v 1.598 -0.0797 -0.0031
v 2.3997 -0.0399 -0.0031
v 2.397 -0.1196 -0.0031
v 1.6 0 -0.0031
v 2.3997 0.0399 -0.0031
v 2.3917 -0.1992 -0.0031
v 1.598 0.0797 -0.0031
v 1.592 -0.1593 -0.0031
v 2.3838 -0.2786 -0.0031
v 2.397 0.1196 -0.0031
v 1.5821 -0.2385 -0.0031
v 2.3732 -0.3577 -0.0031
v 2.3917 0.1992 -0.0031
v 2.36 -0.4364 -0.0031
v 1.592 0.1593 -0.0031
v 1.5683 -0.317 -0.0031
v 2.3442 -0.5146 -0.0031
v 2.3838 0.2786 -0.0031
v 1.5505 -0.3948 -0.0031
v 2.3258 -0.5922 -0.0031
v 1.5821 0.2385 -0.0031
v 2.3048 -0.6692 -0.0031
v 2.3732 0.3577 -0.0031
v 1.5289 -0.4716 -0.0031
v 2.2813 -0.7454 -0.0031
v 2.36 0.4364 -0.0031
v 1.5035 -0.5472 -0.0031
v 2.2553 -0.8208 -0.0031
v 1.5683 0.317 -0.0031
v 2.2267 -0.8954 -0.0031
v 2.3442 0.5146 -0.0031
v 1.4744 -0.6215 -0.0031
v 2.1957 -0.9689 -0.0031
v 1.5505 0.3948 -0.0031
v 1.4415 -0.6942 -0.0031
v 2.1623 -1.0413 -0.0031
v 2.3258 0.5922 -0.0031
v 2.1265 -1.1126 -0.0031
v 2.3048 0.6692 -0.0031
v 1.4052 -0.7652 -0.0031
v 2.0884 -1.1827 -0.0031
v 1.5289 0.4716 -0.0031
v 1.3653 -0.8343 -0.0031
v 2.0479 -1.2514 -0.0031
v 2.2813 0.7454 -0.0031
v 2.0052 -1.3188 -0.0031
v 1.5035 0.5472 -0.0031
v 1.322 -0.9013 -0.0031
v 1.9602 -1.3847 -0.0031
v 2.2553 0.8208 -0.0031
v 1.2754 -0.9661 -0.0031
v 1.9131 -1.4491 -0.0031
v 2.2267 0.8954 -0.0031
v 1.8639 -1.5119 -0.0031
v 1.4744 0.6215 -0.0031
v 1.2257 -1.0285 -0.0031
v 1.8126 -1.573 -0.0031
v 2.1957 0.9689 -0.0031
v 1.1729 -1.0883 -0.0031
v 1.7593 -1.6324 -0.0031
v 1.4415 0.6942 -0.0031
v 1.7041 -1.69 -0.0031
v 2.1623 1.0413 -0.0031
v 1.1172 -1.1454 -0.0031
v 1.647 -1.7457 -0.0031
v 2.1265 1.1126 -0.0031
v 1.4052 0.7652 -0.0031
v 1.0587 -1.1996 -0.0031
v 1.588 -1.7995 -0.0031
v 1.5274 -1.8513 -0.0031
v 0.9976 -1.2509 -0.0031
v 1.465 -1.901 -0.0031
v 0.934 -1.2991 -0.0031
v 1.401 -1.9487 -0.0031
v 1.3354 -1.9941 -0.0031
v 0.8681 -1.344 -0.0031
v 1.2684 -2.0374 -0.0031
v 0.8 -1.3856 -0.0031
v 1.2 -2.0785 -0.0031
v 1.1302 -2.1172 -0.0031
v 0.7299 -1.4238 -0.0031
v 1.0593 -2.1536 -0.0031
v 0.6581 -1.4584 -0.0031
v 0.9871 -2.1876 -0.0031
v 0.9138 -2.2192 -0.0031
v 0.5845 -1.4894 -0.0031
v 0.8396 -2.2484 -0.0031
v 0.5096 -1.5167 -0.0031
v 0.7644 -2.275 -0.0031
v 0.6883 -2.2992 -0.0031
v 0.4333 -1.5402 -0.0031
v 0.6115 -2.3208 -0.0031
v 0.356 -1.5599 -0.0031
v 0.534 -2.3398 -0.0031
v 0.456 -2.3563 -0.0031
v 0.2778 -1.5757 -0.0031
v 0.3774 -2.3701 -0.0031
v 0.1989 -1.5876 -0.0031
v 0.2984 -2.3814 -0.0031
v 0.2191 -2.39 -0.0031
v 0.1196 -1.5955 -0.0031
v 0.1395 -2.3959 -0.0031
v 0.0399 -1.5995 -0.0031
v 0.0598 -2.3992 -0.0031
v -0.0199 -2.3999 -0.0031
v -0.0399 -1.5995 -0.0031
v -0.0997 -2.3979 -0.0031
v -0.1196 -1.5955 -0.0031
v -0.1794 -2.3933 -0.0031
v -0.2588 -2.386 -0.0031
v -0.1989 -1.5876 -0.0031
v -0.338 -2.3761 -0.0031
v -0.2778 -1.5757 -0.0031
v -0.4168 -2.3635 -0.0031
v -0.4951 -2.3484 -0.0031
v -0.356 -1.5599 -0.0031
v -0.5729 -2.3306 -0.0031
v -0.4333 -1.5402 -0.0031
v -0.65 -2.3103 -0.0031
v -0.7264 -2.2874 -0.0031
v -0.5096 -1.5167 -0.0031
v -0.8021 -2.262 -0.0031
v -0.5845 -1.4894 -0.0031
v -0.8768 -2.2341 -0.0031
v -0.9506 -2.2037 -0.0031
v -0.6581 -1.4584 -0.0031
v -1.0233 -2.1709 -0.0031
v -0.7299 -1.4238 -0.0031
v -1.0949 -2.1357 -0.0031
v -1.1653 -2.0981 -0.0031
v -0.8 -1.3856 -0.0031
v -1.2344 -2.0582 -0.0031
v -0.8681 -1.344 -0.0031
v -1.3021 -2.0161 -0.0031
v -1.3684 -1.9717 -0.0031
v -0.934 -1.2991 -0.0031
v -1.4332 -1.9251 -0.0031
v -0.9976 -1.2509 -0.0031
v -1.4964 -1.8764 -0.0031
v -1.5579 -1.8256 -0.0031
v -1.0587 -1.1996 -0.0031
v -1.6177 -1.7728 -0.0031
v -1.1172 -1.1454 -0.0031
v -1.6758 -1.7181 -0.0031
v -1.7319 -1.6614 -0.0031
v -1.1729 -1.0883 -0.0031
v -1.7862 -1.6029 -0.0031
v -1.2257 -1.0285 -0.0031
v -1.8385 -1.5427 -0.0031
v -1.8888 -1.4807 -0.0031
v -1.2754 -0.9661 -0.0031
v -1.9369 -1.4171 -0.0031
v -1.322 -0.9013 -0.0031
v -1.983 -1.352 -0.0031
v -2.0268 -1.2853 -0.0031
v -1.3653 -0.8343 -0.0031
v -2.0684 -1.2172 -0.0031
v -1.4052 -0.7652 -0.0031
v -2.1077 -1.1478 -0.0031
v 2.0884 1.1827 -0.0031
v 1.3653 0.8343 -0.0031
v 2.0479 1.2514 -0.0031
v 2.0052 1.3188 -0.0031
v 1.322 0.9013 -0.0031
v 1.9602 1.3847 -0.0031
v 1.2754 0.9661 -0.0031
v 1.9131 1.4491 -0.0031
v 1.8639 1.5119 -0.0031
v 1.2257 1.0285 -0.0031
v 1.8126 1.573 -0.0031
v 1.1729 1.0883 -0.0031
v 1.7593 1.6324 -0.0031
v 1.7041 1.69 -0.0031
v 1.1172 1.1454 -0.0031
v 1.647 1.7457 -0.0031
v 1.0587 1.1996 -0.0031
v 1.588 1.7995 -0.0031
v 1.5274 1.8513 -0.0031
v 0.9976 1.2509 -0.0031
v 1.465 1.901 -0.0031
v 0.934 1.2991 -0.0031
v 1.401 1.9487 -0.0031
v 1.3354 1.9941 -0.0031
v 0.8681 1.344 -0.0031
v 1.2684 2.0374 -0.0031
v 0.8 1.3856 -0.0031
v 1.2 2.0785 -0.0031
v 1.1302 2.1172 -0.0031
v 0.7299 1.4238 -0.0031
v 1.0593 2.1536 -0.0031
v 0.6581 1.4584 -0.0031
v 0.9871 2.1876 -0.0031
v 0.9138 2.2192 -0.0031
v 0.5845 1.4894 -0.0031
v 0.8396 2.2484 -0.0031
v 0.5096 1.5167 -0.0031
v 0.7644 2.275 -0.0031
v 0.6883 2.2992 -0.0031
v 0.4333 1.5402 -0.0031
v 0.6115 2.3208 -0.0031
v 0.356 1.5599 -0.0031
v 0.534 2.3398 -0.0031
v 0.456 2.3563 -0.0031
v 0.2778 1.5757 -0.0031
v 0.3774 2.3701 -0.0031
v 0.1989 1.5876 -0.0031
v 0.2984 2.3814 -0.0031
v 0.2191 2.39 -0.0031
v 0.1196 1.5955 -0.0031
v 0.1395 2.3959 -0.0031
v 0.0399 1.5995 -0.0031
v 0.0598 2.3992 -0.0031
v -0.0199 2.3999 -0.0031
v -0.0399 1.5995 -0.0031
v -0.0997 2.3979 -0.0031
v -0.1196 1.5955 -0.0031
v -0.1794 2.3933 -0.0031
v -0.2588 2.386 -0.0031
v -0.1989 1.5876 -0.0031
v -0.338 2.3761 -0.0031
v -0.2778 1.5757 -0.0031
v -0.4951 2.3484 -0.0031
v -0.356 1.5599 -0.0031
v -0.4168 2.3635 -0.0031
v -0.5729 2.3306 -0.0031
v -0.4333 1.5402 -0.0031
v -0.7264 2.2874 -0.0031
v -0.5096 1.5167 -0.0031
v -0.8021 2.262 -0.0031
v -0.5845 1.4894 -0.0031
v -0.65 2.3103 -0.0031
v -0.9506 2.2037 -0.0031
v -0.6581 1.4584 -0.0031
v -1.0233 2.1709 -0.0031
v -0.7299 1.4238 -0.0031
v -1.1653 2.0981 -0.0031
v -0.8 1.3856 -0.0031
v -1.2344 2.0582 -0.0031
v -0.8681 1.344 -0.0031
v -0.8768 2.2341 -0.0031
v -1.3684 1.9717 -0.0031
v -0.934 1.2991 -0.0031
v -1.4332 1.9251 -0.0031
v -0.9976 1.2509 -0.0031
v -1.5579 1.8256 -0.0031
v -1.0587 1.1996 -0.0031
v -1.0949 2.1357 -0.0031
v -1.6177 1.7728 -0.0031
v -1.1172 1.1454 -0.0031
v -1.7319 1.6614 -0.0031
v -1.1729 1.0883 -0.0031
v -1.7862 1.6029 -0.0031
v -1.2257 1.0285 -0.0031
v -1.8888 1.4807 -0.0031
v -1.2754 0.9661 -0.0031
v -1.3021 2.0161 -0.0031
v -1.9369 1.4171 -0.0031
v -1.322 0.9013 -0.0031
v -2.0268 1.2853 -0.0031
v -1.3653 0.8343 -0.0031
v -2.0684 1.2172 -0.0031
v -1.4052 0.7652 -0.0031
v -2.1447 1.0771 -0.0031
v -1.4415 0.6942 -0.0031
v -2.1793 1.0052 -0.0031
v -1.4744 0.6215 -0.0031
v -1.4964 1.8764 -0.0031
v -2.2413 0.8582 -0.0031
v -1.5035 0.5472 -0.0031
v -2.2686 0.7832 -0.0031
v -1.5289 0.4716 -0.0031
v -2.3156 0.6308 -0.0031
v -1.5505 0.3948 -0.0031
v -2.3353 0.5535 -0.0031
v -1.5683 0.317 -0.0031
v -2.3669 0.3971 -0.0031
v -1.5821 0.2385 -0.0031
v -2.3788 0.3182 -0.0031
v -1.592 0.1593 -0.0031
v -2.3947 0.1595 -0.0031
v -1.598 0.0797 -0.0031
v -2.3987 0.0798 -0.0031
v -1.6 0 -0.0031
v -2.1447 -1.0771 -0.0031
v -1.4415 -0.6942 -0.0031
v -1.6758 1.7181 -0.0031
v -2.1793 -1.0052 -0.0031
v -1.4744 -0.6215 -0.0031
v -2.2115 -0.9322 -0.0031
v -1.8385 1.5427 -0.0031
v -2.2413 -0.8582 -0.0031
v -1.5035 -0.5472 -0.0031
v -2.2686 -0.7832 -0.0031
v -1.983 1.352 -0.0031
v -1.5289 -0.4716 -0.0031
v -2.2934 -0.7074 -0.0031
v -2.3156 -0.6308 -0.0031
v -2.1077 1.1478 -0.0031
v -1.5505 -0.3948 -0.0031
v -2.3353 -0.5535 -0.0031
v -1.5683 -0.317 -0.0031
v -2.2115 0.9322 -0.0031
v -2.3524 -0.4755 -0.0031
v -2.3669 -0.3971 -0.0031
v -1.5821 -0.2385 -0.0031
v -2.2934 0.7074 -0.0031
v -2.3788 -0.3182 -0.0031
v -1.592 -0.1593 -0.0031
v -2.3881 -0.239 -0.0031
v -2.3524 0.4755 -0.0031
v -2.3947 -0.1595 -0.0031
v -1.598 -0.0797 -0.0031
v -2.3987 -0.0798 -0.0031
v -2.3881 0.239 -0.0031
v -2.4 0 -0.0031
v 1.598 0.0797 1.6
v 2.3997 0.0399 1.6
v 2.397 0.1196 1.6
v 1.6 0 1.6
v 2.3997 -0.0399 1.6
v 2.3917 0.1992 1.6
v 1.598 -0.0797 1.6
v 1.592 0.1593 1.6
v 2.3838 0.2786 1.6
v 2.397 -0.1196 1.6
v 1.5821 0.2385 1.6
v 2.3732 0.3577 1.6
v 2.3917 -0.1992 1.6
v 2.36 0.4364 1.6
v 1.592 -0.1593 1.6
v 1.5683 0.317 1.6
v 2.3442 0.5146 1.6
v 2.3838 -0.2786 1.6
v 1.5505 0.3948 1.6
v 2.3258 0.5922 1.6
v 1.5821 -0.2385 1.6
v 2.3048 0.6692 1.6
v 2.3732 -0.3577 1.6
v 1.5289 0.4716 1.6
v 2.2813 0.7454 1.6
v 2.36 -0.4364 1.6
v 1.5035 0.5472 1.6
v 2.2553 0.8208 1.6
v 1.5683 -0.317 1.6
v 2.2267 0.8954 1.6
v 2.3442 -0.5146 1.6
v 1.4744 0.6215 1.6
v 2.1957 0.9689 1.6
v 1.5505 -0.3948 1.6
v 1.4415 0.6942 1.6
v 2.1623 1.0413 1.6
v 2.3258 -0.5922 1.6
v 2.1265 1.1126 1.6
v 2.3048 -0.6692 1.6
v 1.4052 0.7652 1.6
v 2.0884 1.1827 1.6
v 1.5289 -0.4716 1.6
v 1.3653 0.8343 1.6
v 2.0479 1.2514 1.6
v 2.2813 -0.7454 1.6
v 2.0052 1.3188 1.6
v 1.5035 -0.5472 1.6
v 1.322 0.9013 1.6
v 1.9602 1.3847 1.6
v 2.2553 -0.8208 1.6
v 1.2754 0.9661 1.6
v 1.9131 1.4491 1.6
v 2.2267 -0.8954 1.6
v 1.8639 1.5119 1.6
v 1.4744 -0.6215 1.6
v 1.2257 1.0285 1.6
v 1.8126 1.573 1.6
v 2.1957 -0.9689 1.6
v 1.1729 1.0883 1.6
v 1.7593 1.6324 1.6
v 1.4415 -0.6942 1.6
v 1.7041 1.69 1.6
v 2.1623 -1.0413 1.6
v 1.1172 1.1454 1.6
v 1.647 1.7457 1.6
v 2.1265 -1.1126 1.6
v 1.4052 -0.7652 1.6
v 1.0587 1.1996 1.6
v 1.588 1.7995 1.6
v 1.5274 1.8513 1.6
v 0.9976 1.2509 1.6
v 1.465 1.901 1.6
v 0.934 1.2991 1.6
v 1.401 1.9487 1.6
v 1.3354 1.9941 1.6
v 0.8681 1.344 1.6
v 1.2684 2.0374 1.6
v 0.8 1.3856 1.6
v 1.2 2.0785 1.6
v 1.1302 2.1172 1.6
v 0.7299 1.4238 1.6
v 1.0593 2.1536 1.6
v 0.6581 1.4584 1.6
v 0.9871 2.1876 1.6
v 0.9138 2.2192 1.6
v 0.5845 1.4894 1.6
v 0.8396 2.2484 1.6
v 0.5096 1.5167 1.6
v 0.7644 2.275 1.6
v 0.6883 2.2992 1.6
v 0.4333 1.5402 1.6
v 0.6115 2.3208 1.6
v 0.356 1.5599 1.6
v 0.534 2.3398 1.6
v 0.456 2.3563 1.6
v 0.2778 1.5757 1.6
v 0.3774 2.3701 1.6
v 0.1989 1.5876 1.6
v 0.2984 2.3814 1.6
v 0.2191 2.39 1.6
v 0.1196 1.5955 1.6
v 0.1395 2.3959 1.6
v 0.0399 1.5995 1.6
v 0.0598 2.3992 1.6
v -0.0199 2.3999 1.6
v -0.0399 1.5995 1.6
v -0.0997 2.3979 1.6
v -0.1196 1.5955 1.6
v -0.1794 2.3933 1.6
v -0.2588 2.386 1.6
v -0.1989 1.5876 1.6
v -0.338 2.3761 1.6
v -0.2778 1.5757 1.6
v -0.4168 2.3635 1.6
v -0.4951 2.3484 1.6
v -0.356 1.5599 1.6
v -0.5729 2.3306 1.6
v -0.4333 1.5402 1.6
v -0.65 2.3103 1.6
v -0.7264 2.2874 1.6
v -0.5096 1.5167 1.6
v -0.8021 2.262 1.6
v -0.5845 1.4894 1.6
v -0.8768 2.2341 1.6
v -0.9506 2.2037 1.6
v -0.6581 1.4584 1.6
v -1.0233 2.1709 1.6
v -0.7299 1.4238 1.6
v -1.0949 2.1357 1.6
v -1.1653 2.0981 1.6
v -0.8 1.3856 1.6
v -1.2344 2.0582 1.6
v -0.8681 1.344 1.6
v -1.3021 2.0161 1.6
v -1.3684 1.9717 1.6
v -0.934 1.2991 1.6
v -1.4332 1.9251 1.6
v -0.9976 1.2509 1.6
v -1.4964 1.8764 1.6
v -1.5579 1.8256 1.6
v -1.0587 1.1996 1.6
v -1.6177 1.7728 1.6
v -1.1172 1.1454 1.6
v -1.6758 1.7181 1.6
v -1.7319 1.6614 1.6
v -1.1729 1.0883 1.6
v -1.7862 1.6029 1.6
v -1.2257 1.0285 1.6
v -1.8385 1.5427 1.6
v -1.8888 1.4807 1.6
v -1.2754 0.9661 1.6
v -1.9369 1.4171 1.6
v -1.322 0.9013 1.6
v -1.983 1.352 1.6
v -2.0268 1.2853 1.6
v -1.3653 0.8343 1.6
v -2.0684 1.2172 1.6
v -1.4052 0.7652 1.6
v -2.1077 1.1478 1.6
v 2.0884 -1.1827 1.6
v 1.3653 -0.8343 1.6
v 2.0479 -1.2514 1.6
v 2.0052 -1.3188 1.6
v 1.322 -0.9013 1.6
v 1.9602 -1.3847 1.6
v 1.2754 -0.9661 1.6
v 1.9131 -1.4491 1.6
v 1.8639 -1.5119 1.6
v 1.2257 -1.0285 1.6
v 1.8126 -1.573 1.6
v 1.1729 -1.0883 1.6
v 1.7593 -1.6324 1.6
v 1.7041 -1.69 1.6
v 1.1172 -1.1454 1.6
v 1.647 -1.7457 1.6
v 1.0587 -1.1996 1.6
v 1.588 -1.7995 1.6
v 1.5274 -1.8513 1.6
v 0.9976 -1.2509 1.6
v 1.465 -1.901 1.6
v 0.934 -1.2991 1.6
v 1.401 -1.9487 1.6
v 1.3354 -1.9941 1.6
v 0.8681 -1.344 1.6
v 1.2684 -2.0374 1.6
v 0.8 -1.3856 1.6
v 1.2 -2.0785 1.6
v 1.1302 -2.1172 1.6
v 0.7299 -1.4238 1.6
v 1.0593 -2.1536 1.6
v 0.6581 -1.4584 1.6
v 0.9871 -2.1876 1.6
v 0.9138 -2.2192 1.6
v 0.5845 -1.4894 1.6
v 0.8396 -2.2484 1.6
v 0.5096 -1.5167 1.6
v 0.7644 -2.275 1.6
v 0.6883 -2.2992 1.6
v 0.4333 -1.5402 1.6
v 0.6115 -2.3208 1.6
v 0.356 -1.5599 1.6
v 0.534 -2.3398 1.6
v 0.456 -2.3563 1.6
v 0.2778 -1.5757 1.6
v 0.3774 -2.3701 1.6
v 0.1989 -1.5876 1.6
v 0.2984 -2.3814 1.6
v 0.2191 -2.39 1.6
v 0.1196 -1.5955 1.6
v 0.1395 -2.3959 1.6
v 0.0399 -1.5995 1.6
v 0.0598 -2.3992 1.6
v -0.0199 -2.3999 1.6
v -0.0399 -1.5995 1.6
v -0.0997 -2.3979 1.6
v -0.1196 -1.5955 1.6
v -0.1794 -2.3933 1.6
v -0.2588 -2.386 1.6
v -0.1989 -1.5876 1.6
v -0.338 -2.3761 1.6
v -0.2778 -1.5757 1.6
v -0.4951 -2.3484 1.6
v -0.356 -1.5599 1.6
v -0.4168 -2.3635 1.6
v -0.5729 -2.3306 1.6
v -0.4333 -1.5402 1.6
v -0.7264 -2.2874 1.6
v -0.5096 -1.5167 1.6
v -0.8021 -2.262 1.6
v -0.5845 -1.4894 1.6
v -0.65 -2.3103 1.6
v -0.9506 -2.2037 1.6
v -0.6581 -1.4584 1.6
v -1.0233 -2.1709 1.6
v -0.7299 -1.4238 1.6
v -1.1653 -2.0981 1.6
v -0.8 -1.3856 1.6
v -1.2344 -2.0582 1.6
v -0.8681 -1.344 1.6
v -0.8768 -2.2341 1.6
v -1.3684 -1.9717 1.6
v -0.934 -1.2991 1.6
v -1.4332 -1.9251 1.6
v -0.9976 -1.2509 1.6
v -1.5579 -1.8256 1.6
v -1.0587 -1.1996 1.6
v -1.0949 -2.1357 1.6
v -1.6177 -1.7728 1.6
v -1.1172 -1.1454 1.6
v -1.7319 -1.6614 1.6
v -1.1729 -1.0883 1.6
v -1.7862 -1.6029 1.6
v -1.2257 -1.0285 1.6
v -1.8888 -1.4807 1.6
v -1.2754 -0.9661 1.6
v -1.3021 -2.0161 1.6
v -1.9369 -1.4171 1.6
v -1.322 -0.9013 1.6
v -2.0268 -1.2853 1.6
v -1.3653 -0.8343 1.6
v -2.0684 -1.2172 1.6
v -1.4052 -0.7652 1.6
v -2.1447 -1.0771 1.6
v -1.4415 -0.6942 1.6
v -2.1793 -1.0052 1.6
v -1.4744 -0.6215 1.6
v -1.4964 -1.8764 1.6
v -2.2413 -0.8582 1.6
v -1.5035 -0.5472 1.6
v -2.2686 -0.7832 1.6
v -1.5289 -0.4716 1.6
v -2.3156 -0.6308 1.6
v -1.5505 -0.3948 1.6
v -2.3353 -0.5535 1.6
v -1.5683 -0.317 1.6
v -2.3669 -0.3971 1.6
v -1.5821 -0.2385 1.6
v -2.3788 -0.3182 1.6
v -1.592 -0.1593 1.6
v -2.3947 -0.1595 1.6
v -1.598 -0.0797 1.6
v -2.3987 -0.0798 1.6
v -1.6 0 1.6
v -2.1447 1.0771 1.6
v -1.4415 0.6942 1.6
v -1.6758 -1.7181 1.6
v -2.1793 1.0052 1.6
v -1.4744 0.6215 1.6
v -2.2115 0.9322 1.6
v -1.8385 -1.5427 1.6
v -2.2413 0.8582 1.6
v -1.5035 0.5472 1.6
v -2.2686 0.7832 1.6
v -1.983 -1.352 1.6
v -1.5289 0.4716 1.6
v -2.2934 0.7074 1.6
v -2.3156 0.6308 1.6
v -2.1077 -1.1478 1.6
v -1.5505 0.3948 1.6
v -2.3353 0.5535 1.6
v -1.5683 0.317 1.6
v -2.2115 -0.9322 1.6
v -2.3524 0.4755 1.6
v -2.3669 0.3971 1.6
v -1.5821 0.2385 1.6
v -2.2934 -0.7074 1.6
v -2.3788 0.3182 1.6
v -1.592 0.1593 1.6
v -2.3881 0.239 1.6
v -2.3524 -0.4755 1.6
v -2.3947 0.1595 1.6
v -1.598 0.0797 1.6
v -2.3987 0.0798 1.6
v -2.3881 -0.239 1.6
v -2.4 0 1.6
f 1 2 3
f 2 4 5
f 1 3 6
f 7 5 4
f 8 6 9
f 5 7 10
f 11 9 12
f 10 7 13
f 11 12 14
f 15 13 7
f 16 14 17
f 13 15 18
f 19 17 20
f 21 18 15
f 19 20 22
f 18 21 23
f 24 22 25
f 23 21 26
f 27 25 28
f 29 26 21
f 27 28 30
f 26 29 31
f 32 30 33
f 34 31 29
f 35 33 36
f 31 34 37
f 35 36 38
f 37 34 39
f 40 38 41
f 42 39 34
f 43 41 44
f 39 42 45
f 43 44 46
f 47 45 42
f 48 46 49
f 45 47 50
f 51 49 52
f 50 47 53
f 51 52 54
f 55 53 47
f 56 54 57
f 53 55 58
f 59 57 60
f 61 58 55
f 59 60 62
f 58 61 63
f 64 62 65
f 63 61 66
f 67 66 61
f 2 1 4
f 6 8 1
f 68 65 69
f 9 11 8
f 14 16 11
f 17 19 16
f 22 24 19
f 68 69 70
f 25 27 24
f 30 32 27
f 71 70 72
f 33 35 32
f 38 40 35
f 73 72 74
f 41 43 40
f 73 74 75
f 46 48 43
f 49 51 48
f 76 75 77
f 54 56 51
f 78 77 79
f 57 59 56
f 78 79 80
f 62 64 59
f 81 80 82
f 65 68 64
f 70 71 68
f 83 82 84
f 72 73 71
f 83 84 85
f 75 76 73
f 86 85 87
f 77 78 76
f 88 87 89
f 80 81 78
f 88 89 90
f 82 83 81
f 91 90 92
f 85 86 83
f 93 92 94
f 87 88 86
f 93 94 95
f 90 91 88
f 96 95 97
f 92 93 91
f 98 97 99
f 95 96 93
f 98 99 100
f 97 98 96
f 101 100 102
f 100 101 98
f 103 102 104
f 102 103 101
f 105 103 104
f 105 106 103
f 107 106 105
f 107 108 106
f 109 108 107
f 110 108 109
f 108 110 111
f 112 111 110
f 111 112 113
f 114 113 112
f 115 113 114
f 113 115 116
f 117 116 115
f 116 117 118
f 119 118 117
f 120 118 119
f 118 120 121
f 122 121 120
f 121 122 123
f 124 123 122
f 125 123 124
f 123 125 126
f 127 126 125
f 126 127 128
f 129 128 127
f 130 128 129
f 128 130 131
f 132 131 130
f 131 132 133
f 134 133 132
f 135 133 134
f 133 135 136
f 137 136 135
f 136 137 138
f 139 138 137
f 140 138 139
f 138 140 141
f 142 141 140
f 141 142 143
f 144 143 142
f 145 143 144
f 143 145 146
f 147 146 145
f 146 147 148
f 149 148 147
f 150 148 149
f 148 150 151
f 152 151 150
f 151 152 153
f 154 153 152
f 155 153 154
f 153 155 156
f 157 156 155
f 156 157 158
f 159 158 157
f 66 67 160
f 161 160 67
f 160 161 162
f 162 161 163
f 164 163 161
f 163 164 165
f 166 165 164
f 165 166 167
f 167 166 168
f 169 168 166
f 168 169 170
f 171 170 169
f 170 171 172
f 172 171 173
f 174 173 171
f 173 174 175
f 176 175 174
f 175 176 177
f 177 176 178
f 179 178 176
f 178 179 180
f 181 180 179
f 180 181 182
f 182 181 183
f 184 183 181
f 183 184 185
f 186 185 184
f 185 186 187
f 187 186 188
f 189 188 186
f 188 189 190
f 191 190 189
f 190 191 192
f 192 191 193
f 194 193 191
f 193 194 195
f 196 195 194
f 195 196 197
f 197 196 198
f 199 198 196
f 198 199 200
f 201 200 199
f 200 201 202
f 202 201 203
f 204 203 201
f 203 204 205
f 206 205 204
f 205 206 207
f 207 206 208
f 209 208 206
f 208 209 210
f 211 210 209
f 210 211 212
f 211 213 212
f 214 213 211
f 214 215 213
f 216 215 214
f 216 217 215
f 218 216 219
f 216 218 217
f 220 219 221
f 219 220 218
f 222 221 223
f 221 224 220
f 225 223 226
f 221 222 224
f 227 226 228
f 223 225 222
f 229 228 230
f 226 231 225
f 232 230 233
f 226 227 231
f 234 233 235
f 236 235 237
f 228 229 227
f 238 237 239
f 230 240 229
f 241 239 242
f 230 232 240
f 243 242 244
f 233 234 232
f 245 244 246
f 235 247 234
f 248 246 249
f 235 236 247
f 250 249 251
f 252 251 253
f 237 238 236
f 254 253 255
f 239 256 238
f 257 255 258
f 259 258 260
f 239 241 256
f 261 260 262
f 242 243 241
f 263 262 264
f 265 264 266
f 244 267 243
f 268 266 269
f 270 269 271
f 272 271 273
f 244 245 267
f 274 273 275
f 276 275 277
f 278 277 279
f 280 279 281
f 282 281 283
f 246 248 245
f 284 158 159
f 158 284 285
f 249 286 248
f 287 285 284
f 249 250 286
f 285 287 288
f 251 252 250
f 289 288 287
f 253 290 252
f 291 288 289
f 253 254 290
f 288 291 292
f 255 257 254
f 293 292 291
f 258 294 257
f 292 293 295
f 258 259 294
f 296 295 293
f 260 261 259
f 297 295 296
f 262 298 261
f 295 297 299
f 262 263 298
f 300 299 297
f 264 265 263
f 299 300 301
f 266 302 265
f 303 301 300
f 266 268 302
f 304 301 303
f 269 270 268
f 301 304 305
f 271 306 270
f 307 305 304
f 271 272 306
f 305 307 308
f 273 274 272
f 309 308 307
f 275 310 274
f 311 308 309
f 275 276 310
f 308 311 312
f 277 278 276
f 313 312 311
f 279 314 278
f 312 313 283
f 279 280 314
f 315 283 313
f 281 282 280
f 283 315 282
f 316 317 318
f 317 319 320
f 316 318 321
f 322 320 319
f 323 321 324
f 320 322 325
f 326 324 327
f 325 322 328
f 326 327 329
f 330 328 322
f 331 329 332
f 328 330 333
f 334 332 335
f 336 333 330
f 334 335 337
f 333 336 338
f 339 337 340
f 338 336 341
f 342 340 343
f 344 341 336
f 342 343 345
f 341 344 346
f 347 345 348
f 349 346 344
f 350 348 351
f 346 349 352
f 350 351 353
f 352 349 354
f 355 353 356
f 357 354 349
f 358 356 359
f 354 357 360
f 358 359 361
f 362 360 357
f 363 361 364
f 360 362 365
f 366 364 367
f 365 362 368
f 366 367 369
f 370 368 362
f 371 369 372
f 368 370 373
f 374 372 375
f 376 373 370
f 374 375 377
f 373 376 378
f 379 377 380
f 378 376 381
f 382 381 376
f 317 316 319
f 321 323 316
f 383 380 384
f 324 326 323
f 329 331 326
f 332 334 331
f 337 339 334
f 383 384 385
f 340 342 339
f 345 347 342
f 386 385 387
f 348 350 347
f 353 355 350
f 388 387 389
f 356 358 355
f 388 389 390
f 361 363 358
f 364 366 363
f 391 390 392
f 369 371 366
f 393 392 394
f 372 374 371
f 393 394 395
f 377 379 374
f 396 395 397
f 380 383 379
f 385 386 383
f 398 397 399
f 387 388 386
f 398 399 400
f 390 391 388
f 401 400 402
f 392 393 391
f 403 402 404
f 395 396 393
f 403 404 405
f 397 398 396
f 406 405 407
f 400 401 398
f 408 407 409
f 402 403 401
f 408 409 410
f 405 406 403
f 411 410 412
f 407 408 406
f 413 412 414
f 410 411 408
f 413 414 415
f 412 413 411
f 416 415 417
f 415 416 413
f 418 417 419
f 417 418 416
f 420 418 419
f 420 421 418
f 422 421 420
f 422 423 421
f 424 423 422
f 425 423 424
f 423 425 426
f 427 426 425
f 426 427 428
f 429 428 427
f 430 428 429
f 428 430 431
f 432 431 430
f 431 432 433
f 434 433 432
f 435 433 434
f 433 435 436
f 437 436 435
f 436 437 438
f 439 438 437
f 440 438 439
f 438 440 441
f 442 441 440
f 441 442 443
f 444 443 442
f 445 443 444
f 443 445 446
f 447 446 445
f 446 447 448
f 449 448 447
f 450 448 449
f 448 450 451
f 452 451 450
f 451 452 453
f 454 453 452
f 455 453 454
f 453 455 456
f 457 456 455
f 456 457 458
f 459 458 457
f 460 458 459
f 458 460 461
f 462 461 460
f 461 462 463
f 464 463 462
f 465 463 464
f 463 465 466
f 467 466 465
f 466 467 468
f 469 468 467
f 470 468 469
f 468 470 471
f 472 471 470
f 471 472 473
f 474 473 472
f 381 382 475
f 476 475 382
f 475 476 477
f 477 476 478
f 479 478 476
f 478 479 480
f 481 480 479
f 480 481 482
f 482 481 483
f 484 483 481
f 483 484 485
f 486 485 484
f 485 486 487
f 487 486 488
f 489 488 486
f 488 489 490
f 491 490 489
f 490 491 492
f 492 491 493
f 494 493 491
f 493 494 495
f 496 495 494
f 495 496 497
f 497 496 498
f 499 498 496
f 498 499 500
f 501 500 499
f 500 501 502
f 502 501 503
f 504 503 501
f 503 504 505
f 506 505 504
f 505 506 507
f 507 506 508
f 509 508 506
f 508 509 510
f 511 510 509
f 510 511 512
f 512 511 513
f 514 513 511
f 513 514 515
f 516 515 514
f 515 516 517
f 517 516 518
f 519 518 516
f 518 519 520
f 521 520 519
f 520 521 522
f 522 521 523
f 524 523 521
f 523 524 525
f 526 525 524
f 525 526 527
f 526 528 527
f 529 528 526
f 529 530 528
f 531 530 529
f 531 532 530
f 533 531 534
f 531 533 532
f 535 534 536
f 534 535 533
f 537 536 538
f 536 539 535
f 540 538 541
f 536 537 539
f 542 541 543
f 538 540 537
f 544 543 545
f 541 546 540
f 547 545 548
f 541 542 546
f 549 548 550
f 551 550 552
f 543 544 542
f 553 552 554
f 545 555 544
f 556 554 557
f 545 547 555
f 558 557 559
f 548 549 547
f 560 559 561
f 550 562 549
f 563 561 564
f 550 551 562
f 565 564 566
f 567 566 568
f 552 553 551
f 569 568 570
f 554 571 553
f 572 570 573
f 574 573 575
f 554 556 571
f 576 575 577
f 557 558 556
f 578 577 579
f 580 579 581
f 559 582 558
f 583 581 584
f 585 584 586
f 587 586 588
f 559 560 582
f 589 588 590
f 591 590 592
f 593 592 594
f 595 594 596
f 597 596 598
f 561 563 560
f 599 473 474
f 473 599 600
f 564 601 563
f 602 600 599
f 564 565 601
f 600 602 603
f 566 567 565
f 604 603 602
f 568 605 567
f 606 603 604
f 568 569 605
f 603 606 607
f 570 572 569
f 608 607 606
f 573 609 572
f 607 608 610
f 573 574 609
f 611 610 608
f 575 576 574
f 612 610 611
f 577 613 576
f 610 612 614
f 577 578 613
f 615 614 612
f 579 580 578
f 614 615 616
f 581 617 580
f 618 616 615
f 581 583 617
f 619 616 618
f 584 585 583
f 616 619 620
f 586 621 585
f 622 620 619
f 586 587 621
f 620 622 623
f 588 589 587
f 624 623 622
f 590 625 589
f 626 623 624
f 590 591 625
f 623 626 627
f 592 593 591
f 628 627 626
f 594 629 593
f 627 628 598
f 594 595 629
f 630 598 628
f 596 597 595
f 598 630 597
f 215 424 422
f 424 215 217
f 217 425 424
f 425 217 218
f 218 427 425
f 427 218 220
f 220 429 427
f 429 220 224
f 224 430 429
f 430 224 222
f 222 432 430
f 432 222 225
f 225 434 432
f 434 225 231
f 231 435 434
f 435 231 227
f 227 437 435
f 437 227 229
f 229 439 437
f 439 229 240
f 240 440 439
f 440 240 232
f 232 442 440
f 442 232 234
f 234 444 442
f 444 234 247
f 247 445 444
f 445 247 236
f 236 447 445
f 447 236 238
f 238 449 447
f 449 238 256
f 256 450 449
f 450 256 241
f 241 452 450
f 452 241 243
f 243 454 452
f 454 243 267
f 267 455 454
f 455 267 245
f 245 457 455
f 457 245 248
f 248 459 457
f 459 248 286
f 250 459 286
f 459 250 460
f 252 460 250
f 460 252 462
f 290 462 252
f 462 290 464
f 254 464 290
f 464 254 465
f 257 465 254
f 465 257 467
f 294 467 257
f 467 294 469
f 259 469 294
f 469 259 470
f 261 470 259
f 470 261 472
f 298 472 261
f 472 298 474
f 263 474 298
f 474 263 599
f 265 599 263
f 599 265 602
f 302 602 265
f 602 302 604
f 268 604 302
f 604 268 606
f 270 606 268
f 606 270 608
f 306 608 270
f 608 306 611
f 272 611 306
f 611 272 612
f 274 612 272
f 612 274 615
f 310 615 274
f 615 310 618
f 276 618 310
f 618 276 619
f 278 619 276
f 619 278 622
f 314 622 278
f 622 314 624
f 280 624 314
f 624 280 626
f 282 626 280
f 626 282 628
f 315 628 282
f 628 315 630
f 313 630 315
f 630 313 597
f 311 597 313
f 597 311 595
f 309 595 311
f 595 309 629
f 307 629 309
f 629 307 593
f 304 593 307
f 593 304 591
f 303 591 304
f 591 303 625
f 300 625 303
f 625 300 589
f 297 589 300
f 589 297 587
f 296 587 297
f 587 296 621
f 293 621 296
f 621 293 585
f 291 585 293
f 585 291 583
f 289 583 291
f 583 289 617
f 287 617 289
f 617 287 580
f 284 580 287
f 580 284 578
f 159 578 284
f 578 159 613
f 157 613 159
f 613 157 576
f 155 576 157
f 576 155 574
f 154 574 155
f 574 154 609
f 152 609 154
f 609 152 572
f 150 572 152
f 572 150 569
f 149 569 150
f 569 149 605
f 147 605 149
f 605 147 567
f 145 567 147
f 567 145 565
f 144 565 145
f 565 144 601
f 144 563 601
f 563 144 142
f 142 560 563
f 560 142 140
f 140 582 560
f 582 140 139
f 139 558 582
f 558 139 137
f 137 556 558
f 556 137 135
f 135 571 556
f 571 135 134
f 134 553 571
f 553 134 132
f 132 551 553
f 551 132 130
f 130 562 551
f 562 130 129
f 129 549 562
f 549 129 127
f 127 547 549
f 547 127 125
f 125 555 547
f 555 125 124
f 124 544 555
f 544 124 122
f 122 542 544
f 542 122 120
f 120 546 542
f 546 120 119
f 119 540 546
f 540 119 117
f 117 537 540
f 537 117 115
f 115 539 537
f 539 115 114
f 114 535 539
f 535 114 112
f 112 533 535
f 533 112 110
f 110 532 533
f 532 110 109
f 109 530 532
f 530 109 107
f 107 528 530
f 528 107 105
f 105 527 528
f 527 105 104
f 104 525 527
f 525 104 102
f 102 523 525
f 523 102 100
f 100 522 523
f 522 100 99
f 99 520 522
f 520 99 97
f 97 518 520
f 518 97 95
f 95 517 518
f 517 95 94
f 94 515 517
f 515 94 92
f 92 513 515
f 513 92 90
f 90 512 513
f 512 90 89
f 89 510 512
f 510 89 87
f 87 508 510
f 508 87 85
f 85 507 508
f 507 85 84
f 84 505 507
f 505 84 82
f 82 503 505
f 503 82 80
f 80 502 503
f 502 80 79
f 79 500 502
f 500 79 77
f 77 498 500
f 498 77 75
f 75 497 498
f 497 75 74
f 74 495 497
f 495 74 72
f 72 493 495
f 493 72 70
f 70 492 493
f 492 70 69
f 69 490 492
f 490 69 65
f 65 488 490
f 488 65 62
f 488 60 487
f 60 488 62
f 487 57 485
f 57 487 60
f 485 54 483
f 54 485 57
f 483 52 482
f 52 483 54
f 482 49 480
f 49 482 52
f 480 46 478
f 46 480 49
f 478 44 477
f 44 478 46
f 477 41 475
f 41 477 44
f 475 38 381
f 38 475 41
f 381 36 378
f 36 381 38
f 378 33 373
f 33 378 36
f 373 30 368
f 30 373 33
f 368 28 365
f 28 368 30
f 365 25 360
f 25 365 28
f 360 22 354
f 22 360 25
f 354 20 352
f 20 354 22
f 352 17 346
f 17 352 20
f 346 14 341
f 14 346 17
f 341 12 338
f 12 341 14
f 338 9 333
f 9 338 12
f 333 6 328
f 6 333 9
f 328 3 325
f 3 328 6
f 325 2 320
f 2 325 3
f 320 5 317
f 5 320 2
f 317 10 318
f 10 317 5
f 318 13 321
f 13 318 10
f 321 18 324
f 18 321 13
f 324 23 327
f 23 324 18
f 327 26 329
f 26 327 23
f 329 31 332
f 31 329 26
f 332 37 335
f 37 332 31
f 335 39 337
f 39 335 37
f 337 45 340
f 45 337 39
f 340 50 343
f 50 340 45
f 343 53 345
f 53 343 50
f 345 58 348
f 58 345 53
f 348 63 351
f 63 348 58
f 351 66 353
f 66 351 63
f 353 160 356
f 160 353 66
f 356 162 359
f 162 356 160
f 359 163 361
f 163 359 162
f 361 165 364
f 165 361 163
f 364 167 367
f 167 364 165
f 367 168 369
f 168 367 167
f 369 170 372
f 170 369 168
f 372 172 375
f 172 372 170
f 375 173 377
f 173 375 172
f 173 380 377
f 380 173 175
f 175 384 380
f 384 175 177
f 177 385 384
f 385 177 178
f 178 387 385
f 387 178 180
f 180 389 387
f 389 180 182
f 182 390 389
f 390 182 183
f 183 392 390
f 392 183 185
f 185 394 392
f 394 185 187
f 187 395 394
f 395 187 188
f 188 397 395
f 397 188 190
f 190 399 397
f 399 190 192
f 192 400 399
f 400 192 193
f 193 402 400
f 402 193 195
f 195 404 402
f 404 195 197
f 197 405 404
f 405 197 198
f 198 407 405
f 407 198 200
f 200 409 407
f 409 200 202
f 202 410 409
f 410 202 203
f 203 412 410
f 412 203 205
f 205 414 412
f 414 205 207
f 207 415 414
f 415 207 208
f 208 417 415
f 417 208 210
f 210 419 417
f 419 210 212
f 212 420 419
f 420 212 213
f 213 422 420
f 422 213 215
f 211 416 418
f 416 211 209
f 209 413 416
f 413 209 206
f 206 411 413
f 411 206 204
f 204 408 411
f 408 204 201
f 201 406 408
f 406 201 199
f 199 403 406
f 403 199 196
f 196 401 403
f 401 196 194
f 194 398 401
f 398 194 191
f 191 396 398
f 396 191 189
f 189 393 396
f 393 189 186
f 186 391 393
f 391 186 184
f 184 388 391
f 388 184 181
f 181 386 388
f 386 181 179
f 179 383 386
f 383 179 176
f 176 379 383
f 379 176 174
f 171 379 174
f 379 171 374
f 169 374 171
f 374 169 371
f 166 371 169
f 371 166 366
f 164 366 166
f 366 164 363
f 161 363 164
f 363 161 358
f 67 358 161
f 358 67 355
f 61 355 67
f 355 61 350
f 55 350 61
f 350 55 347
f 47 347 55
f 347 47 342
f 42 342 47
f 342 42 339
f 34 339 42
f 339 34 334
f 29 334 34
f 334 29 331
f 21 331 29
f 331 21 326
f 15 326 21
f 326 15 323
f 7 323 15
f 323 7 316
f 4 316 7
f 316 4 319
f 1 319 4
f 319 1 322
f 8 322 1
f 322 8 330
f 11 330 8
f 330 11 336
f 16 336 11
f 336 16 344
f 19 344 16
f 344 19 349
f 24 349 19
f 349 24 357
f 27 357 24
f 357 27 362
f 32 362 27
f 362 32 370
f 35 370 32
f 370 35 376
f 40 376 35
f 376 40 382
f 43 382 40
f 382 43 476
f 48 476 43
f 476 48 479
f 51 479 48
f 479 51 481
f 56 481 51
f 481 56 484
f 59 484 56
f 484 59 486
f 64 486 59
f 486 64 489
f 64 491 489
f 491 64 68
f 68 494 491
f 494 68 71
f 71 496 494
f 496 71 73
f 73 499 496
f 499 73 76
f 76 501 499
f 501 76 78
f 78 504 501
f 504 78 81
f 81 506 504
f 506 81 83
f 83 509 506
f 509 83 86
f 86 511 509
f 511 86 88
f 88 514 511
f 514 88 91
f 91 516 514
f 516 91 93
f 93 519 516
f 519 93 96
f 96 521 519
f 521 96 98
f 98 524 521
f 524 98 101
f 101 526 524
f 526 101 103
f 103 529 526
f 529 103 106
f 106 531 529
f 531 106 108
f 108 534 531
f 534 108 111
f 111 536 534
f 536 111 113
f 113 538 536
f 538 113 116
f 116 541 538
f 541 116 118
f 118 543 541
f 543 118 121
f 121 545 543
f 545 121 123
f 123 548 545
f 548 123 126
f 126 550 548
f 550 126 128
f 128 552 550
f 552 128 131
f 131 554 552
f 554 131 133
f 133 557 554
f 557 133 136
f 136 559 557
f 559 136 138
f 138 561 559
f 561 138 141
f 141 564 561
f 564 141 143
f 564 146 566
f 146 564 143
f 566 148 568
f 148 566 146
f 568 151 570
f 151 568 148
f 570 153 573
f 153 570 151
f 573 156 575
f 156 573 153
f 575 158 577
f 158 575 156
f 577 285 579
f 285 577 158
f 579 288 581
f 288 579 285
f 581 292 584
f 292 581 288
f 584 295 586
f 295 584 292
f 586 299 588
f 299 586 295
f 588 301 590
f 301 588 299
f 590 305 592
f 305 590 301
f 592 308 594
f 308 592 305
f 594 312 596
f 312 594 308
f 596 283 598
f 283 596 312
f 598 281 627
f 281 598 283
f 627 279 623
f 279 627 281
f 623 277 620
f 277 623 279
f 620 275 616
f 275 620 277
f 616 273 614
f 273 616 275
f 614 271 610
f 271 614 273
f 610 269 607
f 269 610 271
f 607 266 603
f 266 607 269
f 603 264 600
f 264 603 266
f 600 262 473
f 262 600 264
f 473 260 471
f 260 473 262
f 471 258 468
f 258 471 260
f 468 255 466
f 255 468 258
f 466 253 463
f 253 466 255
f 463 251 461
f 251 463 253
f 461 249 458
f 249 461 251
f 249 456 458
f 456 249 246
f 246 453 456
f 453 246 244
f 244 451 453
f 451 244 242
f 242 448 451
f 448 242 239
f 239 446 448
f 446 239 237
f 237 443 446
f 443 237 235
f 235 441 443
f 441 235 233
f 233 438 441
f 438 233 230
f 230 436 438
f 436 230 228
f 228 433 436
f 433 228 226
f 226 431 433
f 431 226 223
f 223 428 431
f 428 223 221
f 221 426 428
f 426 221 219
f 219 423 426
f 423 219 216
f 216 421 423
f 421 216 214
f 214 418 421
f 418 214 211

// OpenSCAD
use <../lib.scad>
use <s/3626cs02.scad>
use <s/3626p8as01.scad>
$fa=1; $fs=0.2;
function ldraw_lib__3626cp8a(realsolid=false) = [
// 0 Minifig Head Female with Peach Lips, Smile, Brown Eyebrows Pattern (Hollow Stud)
// 0 Name: 3626cp8a.dat
// 0 Author: Howard Lande [HowardLande]
// 0 !LDRAW_ORG Part UPDATE 2020-02
// 0 !LICENSE Licensed under CC BY 2.0 and CC BY 4.0 : see CAreadme.txt
// 
// 0 BFC CERTIFY CCW
  [0,"BFC","CERTIFY"],
  [0,"BFC","CCW"],
// 
// 0 !HISTORY 2020-06-28 [PTadmin] Official Update 2020-01
// 0 !HISTORY 2020-07-23 [cwdee] Update description
// 0 !HISTORY 2020-09-05 [PTadmin] Official Update 2020-02
// 
// 
// 1 16 0 0 0 1 0 0 0 1 0 0 0 1 s\3626cs02.dat
  [1,16,0,0,0,1,0,0,0,1,0,0,0,1, ldraw_lib__s__3626cs02(realsolid)],
// 1 16 0 0 0 1 0 0 0 1 0 0 0 1 s\3626p8as01.dat
  [1,16,0,0,0,1,0,0,0,1,0,0,0,1, ldraw_lib__s__3626p8as01(realsolid)],
];
module ldraw_lib__3626cp8a(step=0, col=false, unit=2/5, alt=false, line=0.2, solid=!$preview)
    makepoly(ldraw_lib__3626cp8a(solid), step=step, col=col, unit=unit, alt=alt, line=line, solid=solid);
ldraw_lib__3626cp8a(line=0.2);
